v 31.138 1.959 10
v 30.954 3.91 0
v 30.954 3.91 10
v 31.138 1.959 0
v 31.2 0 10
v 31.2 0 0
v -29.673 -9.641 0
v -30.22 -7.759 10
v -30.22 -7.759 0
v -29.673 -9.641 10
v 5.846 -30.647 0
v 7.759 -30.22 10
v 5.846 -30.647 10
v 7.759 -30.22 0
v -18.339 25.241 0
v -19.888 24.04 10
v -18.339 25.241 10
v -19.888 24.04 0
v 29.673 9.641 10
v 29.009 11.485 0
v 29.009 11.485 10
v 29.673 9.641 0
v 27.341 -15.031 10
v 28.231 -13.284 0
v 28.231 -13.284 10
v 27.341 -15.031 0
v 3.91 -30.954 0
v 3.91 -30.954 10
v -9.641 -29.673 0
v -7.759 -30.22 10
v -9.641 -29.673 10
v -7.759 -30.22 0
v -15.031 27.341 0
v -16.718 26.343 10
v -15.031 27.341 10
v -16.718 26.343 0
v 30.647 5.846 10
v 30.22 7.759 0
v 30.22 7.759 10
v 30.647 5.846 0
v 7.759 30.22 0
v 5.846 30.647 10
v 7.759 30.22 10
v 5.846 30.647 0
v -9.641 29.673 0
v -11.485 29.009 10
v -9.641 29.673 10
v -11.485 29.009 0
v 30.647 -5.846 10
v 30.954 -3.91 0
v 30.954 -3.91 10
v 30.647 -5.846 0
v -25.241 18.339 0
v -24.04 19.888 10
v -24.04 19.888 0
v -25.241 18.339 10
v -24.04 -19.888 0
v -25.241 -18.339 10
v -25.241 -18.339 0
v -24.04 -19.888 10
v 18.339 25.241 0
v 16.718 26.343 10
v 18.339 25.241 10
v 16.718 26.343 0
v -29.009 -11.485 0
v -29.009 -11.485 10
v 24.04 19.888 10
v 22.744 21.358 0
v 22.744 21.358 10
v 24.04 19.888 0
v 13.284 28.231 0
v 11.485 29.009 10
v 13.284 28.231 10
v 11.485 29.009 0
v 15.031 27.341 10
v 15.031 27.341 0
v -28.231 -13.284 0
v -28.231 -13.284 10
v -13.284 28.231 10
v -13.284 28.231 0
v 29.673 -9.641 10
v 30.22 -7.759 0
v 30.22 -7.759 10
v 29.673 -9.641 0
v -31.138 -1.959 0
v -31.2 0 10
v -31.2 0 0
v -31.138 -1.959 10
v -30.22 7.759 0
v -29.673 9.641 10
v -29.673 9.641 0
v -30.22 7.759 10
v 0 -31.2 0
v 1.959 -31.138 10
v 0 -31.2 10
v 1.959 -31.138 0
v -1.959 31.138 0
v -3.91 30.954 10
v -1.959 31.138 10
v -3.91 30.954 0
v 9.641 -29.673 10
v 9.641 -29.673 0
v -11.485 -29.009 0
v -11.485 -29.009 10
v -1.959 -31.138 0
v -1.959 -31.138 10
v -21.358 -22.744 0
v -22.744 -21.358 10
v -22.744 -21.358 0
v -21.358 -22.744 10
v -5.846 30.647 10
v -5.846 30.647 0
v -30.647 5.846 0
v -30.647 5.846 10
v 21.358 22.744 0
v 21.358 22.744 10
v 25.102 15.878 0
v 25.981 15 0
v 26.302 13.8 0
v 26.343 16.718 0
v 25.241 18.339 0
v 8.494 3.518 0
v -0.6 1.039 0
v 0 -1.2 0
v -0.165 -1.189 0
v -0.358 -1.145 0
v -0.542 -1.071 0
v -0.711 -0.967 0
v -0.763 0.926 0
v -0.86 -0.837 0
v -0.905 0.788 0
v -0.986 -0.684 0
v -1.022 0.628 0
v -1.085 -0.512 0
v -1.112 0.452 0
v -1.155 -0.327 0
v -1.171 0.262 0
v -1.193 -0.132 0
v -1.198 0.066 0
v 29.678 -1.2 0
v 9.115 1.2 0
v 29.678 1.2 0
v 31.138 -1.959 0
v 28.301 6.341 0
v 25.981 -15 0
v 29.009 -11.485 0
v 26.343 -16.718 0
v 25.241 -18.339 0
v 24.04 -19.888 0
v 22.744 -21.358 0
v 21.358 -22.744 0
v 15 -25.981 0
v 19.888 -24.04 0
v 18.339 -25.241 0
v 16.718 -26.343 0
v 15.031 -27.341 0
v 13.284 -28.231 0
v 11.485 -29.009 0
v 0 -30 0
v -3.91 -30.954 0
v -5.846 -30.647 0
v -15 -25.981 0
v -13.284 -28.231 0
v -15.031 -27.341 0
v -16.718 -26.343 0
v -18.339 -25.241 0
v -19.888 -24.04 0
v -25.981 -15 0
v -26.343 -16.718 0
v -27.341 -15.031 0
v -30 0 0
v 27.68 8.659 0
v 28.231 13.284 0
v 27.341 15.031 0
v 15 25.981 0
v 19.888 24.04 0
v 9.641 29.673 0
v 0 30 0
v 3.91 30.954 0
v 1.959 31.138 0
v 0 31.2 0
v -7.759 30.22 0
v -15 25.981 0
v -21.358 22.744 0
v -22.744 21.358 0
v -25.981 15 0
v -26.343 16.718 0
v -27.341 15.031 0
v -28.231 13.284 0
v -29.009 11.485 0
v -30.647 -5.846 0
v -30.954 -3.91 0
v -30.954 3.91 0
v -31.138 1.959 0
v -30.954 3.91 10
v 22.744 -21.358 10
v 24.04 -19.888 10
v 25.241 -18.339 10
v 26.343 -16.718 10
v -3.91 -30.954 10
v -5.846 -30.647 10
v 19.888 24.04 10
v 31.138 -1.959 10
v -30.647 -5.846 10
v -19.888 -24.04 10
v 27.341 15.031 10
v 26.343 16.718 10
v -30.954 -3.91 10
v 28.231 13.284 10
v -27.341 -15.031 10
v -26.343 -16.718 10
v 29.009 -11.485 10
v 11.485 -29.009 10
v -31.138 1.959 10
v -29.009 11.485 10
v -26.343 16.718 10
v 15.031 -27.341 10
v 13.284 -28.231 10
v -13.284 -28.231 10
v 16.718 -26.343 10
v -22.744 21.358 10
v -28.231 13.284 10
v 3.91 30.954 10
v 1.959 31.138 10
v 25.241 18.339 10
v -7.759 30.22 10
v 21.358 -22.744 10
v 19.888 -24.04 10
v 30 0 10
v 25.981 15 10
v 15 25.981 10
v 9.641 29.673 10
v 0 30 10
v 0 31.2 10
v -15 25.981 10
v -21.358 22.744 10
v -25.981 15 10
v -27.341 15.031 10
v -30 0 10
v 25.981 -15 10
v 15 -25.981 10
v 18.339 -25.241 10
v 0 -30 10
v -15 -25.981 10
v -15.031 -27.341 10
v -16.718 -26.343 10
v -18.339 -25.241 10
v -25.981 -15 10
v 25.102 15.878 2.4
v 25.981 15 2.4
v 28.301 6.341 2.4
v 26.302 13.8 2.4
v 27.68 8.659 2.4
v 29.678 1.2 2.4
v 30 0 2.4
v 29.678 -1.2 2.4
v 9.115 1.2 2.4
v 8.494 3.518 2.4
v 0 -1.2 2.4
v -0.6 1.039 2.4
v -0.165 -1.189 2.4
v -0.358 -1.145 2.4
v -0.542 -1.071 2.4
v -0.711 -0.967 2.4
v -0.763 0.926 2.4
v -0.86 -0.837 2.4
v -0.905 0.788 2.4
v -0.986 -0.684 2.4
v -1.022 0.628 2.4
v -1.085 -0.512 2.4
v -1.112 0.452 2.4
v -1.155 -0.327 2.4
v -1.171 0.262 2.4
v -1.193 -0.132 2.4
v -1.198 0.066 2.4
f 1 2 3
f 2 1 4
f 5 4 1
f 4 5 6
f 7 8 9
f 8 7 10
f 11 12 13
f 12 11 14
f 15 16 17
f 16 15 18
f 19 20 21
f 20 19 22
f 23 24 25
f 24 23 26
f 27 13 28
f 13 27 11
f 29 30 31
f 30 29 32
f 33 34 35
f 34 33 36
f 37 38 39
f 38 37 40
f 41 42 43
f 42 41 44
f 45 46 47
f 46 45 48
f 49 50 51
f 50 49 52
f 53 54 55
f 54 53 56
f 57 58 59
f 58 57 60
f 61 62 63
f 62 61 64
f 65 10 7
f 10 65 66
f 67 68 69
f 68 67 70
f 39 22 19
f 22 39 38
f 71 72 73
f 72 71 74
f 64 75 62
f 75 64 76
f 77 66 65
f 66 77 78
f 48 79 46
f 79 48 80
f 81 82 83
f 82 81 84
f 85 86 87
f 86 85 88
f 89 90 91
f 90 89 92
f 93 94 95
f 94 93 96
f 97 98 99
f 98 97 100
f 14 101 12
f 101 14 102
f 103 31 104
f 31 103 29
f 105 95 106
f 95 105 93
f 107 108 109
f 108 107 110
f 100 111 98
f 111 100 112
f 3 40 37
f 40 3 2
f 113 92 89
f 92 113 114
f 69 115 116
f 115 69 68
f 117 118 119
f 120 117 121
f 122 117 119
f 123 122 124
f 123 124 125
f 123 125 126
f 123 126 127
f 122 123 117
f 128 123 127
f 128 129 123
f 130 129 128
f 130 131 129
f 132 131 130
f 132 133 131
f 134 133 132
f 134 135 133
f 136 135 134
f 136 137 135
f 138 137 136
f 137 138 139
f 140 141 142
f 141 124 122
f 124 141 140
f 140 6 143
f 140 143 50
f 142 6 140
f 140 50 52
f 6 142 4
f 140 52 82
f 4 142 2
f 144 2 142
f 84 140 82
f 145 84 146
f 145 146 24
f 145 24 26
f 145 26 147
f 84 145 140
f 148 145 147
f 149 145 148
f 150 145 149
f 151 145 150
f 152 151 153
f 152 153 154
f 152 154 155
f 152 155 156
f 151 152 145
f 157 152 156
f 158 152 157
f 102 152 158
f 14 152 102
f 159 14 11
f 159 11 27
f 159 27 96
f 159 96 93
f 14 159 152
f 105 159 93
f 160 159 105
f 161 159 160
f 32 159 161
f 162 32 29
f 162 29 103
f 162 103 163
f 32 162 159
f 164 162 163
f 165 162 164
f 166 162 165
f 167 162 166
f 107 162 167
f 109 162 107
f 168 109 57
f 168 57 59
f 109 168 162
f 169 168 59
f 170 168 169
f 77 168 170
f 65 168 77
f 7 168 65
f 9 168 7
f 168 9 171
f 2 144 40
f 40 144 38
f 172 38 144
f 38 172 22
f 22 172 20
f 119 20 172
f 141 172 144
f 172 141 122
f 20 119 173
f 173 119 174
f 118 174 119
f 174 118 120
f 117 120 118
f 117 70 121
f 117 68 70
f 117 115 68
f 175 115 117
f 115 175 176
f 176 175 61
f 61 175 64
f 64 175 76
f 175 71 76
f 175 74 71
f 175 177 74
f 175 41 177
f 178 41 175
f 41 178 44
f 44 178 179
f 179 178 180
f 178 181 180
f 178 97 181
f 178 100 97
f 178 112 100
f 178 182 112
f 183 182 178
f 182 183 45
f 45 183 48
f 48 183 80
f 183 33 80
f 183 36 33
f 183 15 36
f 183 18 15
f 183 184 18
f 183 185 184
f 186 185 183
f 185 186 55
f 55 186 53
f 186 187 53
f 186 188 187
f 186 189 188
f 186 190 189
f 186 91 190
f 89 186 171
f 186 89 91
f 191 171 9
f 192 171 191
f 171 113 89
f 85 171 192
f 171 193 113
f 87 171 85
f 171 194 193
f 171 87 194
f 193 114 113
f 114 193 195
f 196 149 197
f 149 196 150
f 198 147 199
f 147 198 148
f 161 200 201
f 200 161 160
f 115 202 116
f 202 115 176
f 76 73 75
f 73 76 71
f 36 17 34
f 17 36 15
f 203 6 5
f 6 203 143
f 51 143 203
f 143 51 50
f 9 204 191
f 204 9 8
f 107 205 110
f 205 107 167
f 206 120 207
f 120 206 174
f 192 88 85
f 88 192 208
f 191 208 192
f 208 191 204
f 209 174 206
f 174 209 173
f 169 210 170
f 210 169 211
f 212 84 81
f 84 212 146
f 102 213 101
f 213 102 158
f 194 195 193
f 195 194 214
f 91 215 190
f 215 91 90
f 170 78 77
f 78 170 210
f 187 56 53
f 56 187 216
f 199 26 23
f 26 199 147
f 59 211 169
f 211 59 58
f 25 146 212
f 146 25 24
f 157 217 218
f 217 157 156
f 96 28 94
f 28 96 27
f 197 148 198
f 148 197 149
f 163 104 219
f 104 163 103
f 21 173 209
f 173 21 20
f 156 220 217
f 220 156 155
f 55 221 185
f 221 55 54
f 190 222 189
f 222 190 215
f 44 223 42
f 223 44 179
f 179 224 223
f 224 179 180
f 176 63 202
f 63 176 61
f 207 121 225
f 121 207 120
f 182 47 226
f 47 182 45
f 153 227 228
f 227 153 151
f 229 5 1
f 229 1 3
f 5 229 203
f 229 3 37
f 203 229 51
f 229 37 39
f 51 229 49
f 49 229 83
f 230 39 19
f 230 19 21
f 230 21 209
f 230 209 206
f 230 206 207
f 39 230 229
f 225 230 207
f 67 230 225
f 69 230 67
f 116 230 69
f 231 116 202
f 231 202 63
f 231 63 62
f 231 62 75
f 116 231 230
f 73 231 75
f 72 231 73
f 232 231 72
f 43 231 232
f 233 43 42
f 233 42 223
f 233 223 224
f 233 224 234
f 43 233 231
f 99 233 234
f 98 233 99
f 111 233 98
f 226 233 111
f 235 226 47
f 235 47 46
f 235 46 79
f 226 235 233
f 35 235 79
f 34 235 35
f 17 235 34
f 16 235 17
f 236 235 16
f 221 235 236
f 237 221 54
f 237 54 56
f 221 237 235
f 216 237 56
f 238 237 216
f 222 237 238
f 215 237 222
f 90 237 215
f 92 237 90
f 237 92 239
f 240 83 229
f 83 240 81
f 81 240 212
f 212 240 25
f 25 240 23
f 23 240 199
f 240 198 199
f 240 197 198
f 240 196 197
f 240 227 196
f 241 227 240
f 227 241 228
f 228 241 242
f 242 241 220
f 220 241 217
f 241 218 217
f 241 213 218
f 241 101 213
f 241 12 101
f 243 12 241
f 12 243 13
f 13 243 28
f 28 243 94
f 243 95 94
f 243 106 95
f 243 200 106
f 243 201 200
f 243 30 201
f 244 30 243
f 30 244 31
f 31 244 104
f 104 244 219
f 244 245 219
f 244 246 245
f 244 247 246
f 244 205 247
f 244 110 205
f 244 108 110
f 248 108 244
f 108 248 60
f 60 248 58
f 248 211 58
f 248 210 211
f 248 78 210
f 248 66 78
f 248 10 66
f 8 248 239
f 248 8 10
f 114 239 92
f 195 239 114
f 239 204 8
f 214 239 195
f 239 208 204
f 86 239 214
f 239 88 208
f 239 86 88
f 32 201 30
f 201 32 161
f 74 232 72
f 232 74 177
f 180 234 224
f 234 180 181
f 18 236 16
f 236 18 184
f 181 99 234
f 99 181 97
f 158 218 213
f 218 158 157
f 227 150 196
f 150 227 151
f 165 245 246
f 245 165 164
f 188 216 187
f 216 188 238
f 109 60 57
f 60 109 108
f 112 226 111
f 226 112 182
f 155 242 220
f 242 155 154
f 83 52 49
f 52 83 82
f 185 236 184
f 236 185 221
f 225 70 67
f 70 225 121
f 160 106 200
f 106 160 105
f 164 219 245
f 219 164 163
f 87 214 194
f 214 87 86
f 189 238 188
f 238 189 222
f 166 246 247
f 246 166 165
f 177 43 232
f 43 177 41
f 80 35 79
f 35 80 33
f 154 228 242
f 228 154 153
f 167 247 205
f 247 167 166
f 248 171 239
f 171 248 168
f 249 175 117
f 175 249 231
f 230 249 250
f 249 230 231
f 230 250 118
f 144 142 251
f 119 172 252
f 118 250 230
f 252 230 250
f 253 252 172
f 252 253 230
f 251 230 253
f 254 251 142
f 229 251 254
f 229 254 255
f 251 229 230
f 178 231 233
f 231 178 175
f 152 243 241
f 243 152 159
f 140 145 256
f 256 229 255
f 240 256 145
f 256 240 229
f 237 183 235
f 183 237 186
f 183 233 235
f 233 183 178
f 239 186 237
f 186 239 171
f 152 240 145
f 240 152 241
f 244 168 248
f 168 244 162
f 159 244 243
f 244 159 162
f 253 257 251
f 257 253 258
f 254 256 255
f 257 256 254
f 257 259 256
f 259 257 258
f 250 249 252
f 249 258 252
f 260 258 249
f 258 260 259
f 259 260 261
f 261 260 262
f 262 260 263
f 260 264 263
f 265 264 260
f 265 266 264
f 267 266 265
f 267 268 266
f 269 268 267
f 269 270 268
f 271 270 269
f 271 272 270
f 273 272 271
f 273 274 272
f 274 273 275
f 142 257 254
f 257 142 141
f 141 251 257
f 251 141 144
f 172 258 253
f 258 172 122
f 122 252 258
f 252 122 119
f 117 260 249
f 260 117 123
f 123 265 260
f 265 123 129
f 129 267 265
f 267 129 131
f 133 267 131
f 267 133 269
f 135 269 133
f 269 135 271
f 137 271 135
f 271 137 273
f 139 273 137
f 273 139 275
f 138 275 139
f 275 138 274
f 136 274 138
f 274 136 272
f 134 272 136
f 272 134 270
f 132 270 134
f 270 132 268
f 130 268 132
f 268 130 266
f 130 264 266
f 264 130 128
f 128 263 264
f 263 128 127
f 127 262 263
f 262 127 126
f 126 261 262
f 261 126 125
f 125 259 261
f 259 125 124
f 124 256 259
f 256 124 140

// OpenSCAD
// file inscribed.scad
// Prints out a circle and its inscribed specified polygon
// (c) 2020 Rich Cameron, CC-BY
// measurements in mm

wall_thickness = 1.2;
radius = 30;
n = 12; //number of sides of circumscribed polygon
height = 10;

$fs = .2;
$fa = 2;

difference(){
	cylinder(h = height, r = radius + wall_thickness, $fn = 100);
	cylinder(h = height * 3, r = radius, center = true, $fn = n);
};


linear_extrude(wall_thickness * 2) intersection() {
	circle(radius);
	union() {
		rotate(180 / n) translate([0, -wall_thickness, 0]) square([radius, 2 *wall_thickness]);
		difference() {
			offset(wall_thickness) intersection_for(a = [0, 180 + 360 / n]) rotate(a) translate([-radius * 2, 0, 0]) square(radius * 4);
			offset(-wall_thickness) intersection_for(a = [0, 180 + 360 / n]) rotate(a) translate([-radius * 2, 0, 0]) square(radius * 4);
		}
	}
}
